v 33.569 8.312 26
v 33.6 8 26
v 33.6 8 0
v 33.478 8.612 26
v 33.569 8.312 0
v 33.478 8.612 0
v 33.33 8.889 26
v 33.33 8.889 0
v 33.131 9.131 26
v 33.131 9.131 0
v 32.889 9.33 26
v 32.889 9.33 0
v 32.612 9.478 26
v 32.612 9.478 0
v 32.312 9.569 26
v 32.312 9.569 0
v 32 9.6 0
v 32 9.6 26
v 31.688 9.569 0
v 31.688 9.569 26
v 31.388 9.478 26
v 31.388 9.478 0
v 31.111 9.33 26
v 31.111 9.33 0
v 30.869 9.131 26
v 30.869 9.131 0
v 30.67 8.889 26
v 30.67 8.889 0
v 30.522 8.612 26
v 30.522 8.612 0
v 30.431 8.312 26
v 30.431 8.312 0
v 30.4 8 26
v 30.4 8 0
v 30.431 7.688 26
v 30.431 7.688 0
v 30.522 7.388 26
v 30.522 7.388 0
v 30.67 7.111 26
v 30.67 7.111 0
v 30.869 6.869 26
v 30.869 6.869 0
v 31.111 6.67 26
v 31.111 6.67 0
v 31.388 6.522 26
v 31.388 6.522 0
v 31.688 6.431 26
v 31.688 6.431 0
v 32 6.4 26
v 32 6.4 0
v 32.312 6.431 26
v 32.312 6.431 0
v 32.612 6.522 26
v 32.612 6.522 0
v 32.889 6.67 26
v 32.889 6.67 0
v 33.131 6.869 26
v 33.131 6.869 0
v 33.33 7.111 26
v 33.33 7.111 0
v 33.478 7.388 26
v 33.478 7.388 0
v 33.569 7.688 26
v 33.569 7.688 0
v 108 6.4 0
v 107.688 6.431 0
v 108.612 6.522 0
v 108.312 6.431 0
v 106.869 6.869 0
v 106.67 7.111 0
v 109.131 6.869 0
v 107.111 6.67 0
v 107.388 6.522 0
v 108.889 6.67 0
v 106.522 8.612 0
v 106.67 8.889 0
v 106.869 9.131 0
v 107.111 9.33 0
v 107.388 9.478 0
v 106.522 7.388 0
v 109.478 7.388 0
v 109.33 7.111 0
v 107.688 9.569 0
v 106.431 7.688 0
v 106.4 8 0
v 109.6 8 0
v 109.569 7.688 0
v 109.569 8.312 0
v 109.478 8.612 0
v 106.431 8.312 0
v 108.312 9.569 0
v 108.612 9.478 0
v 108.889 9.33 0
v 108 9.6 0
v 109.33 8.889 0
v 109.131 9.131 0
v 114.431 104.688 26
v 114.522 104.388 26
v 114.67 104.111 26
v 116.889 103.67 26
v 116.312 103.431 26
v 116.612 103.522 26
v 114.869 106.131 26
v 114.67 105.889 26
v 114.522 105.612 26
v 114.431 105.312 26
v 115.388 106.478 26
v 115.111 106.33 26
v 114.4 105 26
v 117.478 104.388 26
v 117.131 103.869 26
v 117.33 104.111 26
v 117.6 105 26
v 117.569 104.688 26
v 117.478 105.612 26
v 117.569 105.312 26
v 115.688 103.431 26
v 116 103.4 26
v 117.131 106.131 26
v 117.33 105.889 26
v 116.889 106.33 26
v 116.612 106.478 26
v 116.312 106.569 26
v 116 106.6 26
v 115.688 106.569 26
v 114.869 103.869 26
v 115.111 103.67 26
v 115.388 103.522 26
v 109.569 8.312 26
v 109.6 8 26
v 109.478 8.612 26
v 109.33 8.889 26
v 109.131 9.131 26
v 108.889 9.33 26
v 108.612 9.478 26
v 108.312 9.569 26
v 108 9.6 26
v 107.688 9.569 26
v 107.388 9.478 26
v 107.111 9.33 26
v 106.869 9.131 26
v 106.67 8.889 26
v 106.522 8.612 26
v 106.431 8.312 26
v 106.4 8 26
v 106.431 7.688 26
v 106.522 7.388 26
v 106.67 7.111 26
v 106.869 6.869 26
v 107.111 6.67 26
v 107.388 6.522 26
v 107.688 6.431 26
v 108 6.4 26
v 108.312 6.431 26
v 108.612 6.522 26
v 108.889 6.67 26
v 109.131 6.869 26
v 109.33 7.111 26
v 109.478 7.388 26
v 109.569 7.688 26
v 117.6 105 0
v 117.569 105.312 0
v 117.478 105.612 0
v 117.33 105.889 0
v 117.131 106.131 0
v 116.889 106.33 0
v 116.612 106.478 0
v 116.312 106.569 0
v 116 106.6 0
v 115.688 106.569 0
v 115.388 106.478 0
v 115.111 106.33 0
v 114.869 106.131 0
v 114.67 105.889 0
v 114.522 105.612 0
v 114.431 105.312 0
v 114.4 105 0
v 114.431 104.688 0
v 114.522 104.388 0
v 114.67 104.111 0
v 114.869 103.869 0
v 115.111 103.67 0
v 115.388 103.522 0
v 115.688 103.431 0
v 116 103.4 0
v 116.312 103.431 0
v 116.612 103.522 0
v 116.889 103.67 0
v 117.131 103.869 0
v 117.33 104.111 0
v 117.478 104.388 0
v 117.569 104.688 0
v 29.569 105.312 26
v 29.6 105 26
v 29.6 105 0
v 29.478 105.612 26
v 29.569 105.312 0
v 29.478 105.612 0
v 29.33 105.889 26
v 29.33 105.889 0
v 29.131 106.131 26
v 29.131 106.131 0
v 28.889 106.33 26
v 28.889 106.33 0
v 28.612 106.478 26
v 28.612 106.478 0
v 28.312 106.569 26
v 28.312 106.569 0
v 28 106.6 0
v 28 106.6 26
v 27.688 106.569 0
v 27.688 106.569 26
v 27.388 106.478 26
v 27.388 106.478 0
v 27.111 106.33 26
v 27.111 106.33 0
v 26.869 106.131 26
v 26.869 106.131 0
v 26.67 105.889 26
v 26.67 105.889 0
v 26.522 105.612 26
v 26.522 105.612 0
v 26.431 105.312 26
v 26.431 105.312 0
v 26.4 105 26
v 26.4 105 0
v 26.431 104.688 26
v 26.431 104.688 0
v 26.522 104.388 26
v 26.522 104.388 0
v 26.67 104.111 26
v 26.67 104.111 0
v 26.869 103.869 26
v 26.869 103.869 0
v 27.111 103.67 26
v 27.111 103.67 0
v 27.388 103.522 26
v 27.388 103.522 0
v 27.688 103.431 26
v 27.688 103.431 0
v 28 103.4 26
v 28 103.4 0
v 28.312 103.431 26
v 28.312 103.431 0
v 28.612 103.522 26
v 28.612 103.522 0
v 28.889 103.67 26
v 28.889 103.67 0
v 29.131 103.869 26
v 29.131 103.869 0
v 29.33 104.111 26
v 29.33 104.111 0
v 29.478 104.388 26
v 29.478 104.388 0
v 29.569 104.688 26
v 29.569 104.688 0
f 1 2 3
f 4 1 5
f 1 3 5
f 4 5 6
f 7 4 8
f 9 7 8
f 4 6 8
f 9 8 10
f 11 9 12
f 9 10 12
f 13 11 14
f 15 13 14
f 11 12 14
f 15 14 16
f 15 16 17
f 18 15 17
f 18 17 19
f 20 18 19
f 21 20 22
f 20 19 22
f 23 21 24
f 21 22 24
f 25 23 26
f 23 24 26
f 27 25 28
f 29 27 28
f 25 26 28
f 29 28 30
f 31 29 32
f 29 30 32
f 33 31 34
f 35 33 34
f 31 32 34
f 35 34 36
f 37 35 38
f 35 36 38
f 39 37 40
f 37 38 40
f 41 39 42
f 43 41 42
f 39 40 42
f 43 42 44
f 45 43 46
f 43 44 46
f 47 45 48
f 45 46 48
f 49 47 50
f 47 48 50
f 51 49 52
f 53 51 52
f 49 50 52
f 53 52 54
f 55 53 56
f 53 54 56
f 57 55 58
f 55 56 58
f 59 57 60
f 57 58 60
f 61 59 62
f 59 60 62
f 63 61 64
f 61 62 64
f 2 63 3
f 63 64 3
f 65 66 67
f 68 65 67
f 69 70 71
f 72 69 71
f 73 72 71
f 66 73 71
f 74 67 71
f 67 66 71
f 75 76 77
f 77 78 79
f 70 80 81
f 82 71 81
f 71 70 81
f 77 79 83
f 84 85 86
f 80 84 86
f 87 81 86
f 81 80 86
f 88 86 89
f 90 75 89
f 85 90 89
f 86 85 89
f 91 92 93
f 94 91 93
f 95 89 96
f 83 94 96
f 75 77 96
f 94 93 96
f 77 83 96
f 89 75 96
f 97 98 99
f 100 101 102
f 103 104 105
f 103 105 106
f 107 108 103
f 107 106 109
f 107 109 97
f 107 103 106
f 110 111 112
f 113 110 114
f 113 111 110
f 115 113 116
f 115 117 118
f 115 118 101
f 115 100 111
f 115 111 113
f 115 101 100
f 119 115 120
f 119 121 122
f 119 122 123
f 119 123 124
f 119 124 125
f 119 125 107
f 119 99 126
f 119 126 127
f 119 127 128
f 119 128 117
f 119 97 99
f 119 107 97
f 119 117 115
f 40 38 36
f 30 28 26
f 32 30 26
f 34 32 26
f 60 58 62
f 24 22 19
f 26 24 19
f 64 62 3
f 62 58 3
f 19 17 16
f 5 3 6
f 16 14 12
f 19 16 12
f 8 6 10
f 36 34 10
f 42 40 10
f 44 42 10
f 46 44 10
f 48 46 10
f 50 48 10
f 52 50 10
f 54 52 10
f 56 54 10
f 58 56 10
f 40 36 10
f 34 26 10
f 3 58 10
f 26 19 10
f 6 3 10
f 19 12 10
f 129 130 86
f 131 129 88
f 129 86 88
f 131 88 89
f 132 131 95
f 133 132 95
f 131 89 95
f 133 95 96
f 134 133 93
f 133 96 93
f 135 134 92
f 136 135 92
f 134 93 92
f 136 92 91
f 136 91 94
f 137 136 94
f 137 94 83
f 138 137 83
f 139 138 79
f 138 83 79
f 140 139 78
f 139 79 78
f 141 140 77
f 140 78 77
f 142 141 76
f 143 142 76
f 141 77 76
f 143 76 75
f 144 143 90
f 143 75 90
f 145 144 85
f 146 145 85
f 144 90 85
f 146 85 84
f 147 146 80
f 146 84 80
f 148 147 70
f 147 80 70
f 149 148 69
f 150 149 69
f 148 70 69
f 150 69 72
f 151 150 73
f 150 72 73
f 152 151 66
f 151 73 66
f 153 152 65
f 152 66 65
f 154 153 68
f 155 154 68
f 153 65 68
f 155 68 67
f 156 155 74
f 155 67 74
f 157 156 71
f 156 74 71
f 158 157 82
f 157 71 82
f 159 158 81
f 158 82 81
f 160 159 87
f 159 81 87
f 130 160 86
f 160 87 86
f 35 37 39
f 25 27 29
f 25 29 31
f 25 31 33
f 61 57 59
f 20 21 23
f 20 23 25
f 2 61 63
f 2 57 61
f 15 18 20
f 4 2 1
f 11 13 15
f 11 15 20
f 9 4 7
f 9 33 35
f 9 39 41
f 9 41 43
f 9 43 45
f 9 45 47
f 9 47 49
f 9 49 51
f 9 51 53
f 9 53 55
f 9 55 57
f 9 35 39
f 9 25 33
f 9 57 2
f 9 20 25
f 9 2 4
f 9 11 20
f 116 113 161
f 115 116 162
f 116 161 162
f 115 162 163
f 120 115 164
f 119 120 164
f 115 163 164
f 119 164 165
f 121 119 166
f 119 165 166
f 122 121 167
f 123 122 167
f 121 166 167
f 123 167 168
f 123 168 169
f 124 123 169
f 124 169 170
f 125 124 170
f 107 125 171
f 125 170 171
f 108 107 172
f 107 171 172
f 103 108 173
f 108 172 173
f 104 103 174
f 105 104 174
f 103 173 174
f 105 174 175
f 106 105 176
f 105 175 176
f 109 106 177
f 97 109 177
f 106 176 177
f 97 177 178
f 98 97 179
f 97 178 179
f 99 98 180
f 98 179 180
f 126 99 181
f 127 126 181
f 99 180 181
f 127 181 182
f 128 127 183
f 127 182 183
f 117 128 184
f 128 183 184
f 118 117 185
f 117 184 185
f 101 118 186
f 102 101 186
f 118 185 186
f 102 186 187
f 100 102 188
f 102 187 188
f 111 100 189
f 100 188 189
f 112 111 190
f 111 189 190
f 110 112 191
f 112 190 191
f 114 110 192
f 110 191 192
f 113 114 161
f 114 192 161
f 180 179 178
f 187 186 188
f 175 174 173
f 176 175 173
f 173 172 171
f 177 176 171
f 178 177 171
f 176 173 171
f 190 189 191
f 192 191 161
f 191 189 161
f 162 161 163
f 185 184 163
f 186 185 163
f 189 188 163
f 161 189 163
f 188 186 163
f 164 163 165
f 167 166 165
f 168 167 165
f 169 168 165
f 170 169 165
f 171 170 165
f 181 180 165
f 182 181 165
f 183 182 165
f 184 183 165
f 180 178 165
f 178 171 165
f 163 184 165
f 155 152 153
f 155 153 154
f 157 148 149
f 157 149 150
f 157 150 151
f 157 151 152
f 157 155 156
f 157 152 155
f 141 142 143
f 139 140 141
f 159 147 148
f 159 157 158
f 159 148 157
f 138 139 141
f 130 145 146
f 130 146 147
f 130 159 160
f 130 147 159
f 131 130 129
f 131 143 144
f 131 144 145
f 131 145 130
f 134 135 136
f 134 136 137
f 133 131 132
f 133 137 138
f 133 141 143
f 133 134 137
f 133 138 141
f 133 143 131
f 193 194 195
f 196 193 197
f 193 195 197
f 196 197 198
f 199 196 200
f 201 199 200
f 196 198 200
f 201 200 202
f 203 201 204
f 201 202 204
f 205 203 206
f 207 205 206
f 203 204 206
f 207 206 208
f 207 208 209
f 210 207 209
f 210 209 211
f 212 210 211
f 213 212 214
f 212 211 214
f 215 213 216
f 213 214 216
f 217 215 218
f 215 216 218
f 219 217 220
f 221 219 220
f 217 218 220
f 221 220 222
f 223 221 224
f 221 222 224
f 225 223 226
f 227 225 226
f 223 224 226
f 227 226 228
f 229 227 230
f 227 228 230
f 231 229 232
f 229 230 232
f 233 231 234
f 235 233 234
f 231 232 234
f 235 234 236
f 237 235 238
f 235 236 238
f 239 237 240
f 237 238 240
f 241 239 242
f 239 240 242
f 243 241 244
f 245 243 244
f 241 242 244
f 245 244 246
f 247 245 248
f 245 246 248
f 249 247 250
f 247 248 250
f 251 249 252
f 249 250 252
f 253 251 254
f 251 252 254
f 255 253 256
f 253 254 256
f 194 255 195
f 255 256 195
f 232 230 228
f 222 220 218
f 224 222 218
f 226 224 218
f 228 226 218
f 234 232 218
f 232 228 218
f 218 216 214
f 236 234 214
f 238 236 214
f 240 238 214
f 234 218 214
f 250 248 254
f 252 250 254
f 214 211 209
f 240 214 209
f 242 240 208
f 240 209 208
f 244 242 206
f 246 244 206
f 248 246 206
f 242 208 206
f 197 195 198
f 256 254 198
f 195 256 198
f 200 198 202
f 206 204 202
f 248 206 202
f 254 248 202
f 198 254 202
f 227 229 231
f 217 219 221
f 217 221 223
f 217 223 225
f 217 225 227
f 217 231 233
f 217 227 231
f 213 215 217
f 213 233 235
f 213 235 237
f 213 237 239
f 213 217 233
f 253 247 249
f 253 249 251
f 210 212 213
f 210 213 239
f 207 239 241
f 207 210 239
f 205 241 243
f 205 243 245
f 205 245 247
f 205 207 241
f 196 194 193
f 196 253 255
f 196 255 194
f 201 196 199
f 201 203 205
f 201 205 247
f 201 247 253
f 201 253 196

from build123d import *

# Parameters (mm, degrees)
CYLINDER096_R     = 1.6
CYLINDER096_DEPTH = 26
CYLINDER097_R     = 1.6
CYLINDER097_DEPTH = 26
CYLINDER098_R     = 1.6
CYLINDER098_DEPTH = 26
CYLINDER095_R     = 1.6
CYLINDER095_DEPTH = 26


with BuildPart() as cylinder098:
    # Cylinder096 → Cylinder096 (new body)
    with BuildSketch(Plane(origin=(32, 8, 0), x_dir=(1, 0, 0), z_dir=(0, 0, 1))):
        Circle(CYLINDER096_R)
    extrude(amount=CYLINDER096_DEPTH)


with BuildPart() as cylinder099:
    # Cylinder097 → Cylinder097 (new body)
    with BuildSketch(Plane(origin=(116, 105, 0), x_dir=(1, 0, 0), z_dir=(0, 0, 1))):
        Circle(CYLINDER097_R)
    extrude(amount=CYLINDER097_DEPTH)


with BuildPart() as cylinder100:
    # Cylinder098 → Cylinder098 (new body)
    with BuildSketch(Plane(origin=(28, 105, 0), x_dir=(1, 0, 0), z_dir=(0, 0, 1))):
        Circle(CYLINDER098_R)
    extrude(amount=CYLINDER098_DEPTH)


with BuildPart() as bottomcuts:
    # Cylinder095 → Cylinder095 (new body)
    with BuildSketch(Plane(origin=(108, 8, 0), x_dir=(1, 0, 0), z_dir=(0, 0, 1))):
        Circle(CYLINDER095_R)
    extrude(amount=CYLINDER095_DEPTH)

    # Fusion045: union Cylinder098, Cylinder099, Cylinder100
    add(cylinder098.part)
    add(cylinder099.part)
    add(cylinder100.part)


solid = bottomcuts.part
